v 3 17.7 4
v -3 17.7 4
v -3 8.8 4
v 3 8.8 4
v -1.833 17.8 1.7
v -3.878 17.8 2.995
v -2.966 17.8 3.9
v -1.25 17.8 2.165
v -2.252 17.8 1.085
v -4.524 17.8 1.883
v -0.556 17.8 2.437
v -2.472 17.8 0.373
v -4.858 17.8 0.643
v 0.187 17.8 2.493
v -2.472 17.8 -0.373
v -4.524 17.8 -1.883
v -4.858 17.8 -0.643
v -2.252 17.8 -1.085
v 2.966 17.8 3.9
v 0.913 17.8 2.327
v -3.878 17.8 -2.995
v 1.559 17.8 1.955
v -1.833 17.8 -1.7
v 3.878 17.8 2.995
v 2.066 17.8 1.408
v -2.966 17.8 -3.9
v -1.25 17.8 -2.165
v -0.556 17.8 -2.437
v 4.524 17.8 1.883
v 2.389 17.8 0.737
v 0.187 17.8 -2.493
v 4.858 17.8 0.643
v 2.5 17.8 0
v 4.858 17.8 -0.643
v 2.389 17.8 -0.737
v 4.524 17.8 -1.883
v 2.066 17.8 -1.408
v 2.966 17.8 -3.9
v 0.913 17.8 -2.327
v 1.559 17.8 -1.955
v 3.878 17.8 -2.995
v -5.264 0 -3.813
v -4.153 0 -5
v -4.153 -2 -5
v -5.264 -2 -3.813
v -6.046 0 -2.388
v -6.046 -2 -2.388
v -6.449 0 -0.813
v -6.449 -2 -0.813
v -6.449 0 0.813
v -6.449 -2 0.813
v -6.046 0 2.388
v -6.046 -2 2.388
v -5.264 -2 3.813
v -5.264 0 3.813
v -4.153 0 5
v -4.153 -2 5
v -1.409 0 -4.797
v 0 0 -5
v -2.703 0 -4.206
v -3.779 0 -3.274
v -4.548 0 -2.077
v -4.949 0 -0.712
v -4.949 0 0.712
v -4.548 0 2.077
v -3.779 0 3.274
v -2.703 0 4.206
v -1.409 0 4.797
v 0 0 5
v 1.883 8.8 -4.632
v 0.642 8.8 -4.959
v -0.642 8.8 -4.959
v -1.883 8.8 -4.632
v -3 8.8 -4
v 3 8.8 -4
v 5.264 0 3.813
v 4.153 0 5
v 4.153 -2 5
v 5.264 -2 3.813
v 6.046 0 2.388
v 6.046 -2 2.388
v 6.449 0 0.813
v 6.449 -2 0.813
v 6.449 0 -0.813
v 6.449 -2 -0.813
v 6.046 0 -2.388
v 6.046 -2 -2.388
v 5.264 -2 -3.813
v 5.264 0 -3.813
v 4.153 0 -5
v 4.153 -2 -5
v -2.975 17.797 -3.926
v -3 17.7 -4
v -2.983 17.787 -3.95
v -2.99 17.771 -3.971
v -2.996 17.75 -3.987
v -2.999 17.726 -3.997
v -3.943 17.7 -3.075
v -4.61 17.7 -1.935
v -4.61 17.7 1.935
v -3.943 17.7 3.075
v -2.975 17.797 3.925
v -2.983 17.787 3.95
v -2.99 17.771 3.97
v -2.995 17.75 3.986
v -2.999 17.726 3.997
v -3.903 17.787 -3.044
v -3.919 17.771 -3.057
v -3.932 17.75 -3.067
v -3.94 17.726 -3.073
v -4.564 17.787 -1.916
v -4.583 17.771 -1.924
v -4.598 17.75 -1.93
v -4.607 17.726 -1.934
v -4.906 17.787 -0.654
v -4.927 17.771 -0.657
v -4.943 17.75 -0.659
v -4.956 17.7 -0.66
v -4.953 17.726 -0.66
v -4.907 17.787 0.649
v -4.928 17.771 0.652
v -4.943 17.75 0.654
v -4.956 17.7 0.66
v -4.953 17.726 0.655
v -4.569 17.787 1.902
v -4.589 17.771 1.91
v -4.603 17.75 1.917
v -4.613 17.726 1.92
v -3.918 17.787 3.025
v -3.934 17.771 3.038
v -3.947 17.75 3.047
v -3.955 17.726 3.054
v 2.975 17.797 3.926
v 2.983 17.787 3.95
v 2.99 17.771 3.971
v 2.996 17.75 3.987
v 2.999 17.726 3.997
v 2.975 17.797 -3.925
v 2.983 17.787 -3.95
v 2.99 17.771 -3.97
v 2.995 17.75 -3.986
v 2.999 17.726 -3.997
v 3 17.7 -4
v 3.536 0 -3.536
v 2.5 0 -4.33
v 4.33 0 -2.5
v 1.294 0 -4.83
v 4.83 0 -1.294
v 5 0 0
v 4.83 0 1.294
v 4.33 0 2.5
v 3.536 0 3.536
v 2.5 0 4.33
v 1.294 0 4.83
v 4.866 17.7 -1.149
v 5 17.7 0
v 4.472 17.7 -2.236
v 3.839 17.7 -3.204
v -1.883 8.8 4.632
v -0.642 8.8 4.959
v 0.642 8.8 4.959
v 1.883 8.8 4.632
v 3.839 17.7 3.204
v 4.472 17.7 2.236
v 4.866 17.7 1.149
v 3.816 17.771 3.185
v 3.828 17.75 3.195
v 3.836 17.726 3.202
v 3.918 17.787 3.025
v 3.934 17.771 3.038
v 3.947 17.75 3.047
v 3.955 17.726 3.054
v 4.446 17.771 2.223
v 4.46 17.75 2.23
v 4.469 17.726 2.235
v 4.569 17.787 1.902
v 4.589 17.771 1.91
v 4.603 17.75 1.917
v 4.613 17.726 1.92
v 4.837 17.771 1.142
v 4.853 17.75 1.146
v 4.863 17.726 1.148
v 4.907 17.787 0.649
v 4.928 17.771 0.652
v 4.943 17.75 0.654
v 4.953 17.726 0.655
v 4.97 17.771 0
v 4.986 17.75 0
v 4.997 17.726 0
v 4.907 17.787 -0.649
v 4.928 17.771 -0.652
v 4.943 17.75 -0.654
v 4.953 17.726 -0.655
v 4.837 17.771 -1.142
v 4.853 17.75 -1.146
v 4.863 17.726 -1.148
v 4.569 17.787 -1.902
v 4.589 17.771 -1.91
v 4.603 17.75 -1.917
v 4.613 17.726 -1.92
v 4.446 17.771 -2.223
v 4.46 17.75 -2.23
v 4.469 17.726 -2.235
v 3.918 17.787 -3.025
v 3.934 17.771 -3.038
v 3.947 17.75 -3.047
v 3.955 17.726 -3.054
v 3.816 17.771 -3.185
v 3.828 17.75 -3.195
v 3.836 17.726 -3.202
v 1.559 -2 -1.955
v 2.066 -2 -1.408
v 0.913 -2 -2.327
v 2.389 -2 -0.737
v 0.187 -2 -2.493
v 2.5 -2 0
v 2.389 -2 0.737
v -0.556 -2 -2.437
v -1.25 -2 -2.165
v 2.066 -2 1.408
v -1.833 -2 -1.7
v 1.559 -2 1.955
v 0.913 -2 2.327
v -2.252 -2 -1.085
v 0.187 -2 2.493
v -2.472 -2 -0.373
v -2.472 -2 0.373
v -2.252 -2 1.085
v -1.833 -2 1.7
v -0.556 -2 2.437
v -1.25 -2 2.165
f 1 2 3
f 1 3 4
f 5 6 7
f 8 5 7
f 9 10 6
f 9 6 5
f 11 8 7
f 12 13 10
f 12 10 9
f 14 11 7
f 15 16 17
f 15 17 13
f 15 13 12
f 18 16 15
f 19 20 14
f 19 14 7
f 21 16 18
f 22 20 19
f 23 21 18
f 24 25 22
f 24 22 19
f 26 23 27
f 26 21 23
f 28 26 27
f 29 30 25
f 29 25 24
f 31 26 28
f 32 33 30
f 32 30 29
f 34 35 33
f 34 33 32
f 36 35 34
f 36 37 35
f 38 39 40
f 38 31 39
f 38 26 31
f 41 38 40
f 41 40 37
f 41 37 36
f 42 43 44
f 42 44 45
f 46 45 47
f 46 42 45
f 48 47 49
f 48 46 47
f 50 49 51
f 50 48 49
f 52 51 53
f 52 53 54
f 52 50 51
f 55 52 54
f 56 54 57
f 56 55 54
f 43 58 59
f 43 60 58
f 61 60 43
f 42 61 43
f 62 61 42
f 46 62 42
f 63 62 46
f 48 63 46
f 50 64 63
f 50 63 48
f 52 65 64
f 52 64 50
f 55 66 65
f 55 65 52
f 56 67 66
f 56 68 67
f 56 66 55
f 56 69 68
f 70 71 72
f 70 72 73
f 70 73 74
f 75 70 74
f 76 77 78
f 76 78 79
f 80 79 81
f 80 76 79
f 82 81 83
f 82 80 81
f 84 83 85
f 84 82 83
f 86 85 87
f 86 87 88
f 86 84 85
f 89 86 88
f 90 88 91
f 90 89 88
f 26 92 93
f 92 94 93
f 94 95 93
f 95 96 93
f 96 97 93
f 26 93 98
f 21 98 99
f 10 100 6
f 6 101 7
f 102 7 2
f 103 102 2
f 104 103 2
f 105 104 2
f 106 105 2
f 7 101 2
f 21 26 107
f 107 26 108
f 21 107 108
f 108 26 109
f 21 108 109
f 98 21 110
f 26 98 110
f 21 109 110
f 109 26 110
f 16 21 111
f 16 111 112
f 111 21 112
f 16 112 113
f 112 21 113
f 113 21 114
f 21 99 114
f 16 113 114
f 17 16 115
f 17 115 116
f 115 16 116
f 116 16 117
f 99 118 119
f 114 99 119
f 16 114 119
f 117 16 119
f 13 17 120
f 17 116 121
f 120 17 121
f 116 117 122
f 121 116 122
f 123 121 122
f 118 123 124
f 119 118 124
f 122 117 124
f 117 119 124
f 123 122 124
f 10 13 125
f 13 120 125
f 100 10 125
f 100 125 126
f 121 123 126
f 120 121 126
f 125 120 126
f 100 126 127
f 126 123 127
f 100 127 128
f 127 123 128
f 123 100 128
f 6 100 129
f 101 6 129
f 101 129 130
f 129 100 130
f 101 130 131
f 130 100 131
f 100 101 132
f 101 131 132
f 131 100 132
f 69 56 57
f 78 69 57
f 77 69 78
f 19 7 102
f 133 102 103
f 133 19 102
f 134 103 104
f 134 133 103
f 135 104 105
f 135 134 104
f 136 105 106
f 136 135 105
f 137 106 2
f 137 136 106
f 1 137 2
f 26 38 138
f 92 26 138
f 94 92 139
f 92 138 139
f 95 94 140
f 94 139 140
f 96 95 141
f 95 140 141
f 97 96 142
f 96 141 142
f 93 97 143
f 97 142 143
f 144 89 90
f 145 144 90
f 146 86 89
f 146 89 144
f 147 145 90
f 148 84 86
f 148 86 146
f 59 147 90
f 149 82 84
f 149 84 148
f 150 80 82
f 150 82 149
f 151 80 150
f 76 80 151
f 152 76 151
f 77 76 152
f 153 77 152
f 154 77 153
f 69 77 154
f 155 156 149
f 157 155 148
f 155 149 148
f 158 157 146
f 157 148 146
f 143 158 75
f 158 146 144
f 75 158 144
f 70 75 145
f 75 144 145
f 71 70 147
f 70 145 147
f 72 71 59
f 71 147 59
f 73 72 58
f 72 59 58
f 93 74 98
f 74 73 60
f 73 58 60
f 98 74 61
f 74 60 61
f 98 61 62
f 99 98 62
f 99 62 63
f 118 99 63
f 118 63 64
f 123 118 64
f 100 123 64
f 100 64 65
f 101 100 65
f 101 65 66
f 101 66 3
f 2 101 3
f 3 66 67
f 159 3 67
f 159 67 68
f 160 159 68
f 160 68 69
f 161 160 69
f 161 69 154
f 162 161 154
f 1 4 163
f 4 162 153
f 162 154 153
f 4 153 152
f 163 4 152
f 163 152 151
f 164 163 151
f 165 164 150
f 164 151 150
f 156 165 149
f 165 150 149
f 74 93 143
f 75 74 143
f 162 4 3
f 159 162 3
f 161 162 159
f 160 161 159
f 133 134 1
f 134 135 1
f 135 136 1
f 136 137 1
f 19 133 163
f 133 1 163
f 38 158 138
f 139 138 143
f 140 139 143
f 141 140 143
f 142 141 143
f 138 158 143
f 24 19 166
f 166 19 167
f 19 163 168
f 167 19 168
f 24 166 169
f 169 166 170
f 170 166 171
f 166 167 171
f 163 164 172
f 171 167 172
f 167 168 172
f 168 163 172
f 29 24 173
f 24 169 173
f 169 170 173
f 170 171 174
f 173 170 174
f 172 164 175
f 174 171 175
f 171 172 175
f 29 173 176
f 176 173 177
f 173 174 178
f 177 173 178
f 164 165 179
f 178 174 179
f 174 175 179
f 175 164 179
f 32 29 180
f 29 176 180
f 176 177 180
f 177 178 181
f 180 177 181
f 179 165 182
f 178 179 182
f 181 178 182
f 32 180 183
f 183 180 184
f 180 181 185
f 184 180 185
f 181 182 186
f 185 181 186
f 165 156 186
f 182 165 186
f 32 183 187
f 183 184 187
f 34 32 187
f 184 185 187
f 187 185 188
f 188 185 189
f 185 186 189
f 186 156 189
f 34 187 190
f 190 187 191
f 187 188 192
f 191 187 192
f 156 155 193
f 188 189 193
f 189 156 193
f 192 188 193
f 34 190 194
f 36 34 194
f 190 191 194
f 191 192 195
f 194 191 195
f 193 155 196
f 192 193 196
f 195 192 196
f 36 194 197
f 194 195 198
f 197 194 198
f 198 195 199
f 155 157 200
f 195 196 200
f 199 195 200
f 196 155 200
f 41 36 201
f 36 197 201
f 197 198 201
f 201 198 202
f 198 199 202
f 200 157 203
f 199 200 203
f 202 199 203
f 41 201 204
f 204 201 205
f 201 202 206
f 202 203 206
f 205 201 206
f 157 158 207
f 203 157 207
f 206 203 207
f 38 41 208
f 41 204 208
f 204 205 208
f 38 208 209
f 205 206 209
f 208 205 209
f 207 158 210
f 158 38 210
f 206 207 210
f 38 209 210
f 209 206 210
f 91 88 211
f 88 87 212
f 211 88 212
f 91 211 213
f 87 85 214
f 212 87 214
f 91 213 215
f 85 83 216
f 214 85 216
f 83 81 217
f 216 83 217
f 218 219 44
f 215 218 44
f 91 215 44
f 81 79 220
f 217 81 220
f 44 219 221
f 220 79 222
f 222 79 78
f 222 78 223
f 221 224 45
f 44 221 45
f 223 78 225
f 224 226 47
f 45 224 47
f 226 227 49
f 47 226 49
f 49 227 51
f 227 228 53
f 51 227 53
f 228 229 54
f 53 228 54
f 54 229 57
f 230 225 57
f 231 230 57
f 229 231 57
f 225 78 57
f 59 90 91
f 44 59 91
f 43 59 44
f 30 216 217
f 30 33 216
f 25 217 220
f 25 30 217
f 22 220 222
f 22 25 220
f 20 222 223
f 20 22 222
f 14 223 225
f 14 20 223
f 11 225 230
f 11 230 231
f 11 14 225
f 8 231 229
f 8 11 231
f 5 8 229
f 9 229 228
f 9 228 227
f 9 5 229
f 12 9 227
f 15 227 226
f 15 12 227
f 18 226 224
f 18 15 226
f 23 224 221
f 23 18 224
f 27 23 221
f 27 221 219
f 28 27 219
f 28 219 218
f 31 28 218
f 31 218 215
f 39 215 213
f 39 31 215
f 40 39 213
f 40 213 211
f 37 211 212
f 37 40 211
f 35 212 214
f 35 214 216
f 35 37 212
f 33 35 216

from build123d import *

# Parameters (mm, degrees)
SKETCH_1_R          = 5
SKETCH_1_R_2        = 2.5
EXTRUDE_1_DEPTH     = 17.8
CUT_EXTRUDE_1_DEPTH = 9
SKETCH_4_R          = 2.5
EXTRUDE_2_DEPTH     = 2
FILLET_1_R          = 0.1


with BuildPart() as part:
    # 草图1 → 凸台-拉伸1 (new body)
    with BuildSketch(Plane(origin=(0, 0, 0), x_dir=(1, 0, 0), z_dir=(0, 1, 0))):
        Circle(SKETCH_1_R)
        Circle(SKETCH_1_R_2, mode=Mode.SUBTRACT)
    extrude(amount=EXTRUDE_1_DEPTH)

    # 草图3 → 切除-拉伸1 (cut)
    with BuildSketch(Plane(origin=(0, 17.8, 0), x_dir=(1, 0, 0), z_dir=(0, 1, 0))):
        with BuildLine():
            Line((-3, -4), (3, -4))
            ThreePointArc((3, -4), (0, -5), (-3, -4))
        make_face()
        with BuildLine():
            Line((-3, 4), (3, 4))
            ThreePointArc((3, 4), (0, 5), (-3, 4))
        make_face()
    extrude(amount=-CUT_EXTRUDE_1_DEPTH, mode=Mode.SUBTRACT)

    # 草图4 → 凸台-拉伸2 (add)
    with BuildSketch(Plane.XZ):
        with BuildLine():
            Line((-4.153311931, 5), (4.153311931, 5))
            ThreePointArc((4.153311931, 5), (6.5, 0), (4.153311931, -5))
            Line((4.153311931, -5), (-4.153311931, -5))
            ThreePointArc((-4.153311931, -5), (-6.5, 0), (-4.153311931, 5))
        make_face()
        Circle(SKETCH_4_R, mode=Mode.SUBTRACT)
    extrude(amount=EXTRUDE_2_DEPTH)

    # 圆角1
    fillet_1_edges = [part.edges().sort_by_distance(p)[0] for p in [
        (0, 17.8, 4),
        (-5, 17.8, 0),
        (0, 17.8, -4),
        (4.472135955, 17.8, 2.236067977),
    ]]
    fillet(fillet_1_edges, radius=FILLET_1_R)


solid = part.part
